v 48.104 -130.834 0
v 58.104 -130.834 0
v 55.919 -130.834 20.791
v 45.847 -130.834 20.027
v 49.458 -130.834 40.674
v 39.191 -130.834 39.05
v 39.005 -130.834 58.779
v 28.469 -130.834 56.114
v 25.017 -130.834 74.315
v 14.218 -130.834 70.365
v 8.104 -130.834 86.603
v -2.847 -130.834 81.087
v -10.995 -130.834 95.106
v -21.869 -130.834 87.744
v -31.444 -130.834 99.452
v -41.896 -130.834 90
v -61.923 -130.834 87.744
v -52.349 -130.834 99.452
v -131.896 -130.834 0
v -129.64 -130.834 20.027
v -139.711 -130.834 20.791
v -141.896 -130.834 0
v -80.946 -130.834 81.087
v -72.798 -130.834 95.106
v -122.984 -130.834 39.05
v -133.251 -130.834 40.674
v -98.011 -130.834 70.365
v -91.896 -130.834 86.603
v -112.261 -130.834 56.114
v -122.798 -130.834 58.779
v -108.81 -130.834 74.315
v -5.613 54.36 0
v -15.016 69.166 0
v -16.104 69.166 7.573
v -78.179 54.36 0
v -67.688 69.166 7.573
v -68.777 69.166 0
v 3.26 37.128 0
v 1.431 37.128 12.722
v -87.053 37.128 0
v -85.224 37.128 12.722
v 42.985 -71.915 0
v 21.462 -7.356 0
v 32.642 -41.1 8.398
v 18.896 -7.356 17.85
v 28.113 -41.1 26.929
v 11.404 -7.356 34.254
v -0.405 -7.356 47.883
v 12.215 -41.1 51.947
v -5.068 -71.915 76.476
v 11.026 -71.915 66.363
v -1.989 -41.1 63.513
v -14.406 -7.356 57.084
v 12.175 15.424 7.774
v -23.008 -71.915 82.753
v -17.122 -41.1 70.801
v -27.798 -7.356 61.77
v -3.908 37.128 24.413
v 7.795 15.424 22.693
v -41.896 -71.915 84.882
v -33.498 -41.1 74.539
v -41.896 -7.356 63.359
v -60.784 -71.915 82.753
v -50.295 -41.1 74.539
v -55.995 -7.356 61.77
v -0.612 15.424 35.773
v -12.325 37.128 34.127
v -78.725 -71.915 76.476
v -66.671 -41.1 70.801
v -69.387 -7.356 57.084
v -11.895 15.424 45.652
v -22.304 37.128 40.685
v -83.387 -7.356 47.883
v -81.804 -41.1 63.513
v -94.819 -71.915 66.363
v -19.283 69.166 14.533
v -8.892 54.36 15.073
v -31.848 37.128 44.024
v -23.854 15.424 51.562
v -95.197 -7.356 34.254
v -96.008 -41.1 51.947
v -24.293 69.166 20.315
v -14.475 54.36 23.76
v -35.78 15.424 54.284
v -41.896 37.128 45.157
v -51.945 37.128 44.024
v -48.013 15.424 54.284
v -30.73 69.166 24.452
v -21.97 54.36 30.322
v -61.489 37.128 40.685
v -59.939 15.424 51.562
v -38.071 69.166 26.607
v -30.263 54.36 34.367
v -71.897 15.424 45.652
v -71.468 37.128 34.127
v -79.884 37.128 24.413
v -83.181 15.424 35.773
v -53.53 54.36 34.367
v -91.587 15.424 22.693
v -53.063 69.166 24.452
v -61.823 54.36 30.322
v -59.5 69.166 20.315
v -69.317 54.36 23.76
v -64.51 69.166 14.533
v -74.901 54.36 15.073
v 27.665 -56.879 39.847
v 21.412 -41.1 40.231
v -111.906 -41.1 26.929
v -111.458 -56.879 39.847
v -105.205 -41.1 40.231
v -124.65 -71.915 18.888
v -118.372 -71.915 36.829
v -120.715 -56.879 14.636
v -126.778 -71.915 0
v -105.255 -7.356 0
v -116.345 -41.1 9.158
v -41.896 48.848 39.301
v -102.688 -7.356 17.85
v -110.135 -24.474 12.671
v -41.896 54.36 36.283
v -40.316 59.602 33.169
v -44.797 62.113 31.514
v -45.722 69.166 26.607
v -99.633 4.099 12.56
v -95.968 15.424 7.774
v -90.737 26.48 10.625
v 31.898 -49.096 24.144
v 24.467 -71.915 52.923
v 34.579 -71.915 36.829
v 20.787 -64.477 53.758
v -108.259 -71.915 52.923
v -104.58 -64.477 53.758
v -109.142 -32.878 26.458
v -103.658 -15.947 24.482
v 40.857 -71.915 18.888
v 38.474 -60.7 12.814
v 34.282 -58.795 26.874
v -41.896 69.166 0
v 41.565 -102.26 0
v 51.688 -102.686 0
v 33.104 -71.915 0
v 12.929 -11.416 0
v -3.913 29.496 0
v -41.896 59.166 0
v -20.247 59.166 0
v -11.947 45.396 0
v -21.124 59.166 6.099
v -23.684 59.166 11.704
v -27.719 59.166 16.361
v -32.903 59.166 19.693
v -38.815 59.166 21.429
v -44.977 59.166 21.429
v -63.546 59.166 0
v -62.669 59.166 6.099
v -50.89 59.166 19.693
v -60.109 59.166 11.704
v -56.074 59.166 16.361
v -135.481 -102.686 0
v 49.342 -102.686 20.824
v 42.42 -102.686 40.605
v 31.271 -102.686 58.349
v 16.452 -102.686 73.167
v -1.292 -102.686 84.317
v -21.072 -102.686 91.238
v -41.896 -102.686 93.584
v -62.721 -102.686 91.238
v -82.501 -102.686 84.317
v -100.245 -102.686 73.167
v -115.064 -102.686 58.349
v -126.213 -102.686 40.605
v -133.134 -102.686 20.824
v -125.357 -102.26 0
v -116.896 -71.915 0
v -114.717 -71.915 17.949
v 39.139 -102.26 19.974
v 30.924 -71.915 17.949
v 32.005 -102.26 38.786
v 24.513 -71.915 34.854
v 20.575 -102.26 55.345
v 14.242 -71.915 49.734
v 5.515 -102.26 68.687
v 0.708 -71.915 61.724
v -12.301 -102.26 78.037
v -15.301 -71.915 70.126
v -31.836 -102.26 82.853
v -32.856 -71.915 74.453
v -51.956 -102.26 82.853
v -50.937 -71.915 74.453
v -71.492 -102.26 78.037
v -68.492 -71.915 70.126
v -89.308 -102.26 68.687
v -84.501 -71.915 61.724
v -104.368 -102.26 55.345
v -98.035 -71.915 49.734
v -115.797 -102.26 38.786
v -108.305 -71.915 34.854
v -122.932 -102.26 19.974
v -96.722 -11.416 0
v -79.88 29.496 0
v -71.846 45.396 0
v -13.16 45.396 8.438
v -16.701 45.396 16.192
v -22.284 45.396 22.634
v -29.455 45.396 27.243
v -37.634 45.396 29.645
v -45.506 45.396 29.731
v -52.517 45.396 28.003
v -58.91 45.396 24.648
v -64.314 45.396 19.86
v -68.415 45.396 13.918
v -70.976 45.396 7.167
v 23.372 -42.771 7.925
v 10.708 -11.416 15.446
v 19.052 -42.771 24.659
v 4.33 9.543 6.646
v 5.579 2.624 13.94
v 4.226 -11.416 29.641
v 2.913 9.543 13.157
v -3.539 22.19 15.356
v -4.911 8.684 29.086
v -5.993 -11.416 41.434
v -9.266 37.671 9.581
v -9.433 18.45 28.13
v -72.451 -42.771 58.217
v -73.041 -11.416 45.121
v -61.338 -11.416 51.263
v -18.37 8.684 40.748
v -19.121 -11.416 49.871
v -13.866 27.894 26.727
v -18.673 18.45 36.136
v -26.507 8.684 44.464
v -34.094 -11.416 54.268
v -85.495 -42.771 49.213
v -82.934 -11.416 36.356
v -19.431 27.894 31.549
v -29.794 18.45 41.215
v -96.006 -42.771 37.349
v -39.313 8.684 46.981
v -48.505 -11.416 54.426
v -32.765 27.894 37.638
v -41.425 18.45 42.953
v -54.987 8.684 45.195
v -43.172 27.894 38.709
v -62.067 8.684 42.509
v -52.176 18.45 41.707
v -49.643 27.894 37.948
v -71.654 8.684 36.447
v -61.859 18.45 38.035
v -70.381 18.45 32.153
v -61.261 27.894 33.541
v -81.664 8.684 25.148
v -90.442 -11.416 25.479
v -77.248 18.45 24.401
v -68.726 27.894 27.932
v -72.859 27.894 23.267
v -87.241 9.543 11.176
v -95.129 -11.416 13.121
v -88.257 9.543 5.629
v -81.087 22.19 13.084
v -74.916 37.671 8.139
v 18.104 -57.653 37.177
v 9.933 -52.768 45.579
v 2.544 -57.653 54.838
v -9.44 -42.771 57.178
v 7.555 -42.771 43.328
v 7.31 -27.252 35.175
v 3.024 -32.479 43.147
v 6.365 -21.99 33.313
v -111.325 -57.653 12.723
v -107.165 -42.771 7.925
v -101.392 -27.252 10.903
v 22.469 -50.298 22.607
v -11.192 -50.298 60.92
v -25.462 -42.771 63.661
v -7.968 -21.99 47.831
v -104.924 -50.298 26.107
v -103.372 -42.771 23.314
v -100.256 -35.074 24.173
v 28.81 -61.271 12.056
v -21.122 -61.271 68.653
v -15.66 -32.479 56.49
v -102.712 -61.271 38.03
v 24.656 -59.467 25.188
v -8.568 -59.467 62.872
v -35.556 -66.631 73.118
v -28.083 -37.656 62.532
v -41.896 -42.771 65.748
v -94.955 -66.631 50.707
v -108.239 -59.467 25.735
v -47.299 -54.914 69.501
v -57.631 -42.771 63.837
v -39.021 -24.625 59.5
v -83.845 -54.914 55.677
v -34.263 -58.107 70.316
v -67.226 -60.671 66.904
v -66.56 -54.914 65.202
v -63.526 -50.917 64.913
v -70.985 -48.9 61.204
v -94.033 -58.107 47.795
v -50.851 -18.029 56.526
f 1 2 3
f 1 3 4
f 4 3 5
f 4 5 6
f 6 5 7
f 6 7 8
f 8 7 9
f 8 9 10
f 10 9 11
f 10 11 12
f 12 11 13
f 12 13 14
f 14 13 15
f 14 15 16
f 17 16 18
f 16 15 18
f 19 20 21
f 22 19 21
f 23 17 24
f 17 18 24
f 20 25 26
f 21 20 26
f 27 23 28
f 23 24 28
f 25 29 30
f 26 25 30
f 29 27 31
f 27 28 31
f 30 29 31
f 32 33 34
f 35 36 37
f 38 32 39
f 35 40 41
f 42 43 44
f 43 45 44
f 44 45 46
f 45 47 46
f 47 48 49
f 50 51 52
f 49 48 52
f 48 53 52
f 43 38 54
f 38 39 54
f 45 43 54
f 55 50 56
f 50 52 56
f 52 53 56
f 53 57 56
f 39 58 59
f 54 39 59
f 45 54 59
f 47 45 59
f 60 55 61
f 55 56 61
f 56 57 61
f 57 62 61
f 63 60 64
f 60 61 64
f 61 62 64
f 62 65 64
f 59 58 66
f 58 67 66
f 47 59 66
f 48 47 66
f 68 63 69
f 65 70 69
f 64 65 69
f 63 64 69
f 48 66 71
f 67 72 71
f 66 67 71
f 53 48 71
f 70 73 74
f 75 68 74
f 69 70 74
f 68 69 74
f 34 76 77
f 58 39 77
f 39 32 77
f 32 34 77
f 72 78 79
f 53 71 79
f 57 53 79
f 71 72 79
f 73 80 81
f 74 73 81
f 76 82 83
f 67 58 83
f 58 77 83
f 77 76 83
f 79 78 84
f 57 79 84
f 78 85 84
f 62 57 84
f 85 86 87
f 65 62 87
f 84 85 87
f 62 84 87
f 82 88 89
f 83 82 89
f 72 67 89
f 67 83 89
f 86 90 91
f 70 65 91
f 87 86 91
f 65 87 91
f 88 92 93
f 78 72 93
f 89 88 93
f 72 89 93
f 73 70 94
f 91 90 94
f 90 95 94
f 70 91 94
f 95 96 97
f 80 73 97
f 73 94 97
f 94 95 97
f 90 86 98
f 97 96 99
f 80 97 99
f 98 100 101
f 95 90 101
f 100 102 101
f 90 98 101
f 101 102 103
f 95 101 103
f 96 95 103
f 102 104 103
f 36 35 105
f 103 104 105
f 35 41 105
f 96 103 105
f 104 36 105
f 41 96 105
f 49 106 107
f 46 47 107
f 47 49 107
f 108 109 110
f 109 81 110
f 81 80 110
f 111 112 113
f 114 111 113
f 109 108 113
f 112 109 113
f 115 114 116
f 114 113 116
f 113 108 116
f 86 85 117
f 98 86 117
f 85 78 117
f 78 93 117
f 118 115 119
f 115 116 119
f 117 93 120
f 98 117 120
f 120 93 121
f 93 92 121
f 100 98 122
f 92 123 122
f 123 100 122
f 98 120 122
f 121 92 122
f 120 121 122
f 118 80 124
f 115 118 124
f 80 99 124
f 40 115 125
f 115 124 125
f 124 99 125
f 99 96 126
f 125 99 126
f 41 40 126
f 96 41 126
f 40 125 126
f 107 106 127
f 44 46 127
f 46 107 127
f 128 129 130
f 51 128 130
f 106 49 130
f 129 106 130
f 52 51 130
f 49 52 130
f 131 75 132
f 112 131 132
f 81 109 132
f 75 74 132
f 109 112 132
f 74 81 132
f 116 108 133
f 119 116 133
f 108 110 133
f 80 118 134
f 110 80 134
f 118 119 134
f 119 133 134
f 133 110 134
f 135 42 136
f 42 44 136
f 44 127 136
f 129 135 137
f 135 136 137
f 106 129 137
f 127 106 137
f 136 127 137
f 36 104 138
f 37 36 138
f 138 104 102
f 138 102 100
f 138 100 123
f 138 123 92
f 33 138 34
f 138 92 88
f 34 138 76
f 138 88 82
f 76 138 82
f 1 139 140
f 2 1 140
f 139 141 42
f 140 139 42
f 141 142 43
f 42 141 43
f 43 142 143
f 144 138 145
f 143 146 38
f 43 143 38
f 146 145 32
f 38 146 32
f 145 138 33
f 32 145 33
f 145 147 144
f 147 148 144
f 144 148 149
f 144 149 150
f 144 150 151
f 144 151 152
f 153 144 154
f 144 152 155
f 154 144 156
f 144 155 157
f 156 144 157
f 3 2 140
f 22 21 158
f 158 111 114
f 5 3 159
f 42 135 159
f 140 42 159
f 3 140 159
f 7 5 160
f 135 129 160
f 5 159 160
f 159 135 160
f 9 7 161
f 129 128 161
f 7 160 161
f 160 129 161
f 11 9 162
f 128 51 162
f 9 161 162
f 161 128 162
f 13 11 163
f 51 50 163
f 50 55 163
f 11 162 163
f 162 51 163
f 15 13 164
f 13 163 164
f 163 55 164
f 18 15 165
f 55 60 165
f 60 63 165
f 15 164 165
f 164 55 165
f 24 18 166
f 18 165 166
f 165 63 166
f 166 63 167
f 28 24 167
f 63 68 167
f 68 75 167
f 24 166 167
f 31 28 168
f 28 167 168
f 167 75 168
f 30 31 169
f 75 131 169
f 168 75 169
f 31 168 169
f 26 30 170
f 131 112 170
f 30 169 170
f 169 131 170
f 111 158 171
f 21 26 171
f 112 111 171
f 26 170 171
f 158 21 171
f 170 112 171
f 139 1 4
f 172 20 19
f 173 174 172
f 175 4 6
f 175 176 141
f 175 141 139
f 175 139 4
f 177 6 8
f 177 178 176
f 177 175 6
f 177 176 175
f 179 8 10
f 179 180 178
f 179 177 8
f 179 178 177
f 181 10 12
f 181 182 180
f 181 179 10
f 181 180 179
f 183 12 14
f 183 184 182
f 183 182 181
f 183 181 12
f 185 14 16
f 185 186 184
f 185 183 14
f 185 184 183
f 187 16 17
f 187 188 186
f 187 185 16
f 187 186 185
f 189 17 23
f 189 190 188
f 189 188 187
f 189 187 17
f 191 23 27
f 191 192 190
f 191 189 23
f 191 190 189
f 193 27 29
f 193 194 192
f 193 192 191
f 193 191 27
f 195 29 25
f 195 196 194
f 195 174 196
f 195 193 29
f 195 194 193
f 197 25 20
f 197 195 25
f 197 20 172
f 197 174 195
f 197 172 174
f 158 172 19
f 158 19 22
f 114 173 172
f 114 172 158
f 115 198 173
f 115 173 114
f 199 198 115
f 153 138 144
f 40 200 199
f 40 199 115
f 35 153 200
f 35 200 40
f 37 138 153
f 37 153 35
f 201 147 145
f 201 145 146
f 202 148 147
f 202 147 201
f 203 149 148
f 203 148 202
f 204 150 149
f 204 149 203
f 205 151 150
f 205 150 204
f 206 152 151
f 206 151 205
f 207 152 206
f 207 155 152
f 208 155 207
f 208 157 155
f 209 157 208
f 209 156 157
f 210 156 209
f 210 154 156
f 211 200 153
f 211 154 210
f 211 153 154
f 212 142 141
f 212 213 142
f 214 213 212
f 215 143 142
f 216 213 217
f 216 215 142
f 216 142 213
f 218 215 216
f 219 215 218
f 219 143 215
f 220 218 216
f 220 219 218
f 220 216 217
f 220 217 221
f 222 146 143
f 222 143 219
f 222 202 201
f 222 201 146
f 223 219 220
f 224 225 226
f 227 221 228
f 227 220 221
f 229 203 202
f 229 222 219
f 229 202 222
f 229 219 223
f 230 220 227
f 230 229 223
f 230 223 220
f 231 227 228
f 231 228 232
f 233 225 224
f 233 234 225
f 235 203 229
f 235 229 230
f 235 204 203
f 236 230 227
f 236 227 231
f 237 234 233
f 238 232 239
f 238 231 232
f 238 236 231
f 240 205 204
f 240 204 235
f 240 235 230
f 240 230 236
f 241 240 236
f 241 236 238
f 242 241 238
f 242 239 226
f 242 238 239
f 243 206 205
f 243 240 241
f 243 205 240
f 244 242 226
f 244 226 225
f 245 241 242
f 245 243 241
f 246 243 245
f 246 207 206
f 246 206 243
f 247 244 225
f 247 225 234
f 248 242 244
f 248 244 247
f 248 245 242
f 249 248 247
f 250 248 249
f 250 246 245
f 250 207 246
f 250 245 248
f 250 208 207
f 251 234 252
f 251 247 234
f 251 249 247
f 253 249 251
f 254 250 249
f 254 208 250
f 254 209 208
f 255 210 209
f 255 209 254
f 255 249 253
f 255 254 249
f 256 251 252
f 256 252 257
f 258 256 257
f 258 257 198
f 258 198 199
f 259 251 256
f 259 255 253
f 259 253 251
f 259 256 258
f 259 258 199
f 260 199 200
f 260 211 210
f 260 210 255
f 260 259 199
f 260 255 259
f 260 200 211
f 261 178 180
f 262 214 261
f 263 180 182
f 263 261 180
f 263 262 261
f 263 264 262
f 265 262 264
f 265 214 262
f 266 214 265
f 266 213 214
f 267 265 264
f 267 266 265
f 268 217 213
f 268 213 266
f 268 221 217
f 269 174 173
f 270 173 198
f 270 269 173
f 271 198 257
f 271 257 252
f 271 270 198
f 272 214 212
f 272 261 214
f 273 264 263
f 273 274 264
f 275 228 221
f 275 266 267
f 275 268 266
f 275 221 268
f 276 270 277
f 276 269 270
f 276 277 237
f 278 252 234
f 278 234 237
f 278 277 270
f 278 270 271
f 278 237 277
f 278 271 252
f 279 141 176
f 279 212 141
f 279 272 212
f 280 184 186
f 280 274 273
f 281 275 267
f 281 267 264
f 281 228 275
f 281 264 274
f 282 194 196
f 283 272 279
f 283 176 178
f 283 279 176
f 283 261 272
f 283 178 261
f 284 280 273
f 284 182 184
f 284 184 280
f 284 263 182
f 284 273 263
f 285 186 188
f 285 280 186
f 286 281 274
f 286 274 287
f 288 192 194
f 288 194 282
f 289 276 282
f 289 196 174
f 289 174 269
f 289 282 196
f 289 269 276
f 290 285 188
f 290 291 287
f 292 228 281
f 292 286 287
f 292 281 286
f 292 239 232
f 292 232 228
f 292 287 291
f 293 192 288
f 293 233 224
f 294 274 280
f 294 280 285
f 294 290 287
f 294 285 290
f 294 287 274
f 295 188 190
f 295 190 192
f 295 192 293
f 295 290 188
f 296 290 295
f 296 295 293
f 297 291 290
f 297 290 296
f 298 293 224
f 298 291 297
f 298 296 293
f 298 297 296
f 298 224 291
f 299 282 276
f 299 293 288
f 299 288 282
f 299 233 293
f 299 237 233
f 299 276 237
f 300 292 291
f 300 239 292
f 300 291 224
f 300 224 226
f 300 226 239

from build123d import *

# Parameters (mm, degrees)
F1_ANGLE = 180


# Not quite as in the source:
# - the dataset's text gives a spline's control points without its knots; the knots are read off the source's solid


with BuildPart() as f1:
    # F0 (on Top) → F1 (revolve)
    with BuildSketch(Plane.XY):
        with BuildLine():
            Line((-15.0155171111, 69.1660211089), (-41.8962485401, 69.1660211089))
            Line((-41.8962485401, 69.1660211089), (-41.8963717975, 59.1659390384))
            Line((-41.8963717975, 59.1659390384), (-20.2472324434, 59.1659390491))
            add(Edge.make_bspline(
                [(33.1035238522, -71.9149671498), (32.1956039275, -68.8975063653), (30.6294745703, -63.7909684), (28.3196130402, -56.4725000911), (26.2505964512, -50.0519807984), (24.0990817026, -43.5000705854), (21.8647786098, -36.8081776409), (19.5529594243, -30.0145868681), (16.3683569347, -20.8591029876), (12.2012714526, -9.3103100361), (6.9186898701, 4.4674267501), (-0.4742289291, 22.3935878339), (-8.3508677217, 39.1456078716), (-15.719087441, 52.1661135478), (-19.0226095104, 57.3411254378), (-20.2472324434, 59.1659390491)],
                knots=[0.3286112864, 0.3286112864, 0.3286112864, 0.3286112864, 0.375, 0.40625, 0.4375, 0.46875, 0.5, 0.53125, 0.5625, 0.625, 0.6875, 0.75, 0.875, 0.9375, 0.9742015542, 0.9742015542, 0.9742015542, 0.9742015542], degree=3))
            Line((33.1035238522, -71.9149671498), (42.9852085247, -71.9149671498))
            add(Edge.make_bspline(
                [(42.9852085247, -71.9149671498), (39.9590182528, -62.0062274912), (25.1654617563, -16.1855840824), (4.2573580541, 42.5444841716), (-15.0155171111, 69.1660211089)],
                knots=[0.3152642845, 0.3152642845, 0.3152642845, 0.3152642845, 0.4687726258, 1, 1, 1, 1], degree=3))
        make_face()
        with BuildLine():
            add(Edge.make_bspline(
                [(58.1037514599, -130.8339788911), (54.1906296951, -111.0809956414), (49.2001783618, -92.2648171488), (42.9852085247, -71.9149671498)],
                knots=[0, 0, 0, 0, 0.3152642845, 0.3152642845, 0.3152642845, 0.3152642845], degree=3))
            Line((42.9852085247, -71.9149671498), (33.1035238522, -71.9149671498))
            add(Edge.make_bspline(
                [(48.1037514599, -130.8339788911), (46.7078713802, -123.9406660172), (44.3454121428, -113.2929426353), (40.6901923565, -98.7187159107), (37.5318209869, -87.037434), (34.9410521612, -78.0565994752), (33.4188539578, -72.9629629054), (33.1035238522, -71.9149671498)],
                knots=[0.0128290388, 0.0128290388, 0.0128290388, 0.0128290388, 0.125, 0.1875, 0.25, 0.3125, 0.3286112864, 0.3286112864, 0.3286112864, 0.3286112864], degree=3))
            Line((48.1037514599, -130.8339788911), (58.1037514599, -130.8339788911))
        make_face()
    revolve(axis=Axis((-41.8963717672, -2.0099732555, 0), (5e-10, -1, 0)), revolution_arc=F1_ANGLE)


solid = f1.part
